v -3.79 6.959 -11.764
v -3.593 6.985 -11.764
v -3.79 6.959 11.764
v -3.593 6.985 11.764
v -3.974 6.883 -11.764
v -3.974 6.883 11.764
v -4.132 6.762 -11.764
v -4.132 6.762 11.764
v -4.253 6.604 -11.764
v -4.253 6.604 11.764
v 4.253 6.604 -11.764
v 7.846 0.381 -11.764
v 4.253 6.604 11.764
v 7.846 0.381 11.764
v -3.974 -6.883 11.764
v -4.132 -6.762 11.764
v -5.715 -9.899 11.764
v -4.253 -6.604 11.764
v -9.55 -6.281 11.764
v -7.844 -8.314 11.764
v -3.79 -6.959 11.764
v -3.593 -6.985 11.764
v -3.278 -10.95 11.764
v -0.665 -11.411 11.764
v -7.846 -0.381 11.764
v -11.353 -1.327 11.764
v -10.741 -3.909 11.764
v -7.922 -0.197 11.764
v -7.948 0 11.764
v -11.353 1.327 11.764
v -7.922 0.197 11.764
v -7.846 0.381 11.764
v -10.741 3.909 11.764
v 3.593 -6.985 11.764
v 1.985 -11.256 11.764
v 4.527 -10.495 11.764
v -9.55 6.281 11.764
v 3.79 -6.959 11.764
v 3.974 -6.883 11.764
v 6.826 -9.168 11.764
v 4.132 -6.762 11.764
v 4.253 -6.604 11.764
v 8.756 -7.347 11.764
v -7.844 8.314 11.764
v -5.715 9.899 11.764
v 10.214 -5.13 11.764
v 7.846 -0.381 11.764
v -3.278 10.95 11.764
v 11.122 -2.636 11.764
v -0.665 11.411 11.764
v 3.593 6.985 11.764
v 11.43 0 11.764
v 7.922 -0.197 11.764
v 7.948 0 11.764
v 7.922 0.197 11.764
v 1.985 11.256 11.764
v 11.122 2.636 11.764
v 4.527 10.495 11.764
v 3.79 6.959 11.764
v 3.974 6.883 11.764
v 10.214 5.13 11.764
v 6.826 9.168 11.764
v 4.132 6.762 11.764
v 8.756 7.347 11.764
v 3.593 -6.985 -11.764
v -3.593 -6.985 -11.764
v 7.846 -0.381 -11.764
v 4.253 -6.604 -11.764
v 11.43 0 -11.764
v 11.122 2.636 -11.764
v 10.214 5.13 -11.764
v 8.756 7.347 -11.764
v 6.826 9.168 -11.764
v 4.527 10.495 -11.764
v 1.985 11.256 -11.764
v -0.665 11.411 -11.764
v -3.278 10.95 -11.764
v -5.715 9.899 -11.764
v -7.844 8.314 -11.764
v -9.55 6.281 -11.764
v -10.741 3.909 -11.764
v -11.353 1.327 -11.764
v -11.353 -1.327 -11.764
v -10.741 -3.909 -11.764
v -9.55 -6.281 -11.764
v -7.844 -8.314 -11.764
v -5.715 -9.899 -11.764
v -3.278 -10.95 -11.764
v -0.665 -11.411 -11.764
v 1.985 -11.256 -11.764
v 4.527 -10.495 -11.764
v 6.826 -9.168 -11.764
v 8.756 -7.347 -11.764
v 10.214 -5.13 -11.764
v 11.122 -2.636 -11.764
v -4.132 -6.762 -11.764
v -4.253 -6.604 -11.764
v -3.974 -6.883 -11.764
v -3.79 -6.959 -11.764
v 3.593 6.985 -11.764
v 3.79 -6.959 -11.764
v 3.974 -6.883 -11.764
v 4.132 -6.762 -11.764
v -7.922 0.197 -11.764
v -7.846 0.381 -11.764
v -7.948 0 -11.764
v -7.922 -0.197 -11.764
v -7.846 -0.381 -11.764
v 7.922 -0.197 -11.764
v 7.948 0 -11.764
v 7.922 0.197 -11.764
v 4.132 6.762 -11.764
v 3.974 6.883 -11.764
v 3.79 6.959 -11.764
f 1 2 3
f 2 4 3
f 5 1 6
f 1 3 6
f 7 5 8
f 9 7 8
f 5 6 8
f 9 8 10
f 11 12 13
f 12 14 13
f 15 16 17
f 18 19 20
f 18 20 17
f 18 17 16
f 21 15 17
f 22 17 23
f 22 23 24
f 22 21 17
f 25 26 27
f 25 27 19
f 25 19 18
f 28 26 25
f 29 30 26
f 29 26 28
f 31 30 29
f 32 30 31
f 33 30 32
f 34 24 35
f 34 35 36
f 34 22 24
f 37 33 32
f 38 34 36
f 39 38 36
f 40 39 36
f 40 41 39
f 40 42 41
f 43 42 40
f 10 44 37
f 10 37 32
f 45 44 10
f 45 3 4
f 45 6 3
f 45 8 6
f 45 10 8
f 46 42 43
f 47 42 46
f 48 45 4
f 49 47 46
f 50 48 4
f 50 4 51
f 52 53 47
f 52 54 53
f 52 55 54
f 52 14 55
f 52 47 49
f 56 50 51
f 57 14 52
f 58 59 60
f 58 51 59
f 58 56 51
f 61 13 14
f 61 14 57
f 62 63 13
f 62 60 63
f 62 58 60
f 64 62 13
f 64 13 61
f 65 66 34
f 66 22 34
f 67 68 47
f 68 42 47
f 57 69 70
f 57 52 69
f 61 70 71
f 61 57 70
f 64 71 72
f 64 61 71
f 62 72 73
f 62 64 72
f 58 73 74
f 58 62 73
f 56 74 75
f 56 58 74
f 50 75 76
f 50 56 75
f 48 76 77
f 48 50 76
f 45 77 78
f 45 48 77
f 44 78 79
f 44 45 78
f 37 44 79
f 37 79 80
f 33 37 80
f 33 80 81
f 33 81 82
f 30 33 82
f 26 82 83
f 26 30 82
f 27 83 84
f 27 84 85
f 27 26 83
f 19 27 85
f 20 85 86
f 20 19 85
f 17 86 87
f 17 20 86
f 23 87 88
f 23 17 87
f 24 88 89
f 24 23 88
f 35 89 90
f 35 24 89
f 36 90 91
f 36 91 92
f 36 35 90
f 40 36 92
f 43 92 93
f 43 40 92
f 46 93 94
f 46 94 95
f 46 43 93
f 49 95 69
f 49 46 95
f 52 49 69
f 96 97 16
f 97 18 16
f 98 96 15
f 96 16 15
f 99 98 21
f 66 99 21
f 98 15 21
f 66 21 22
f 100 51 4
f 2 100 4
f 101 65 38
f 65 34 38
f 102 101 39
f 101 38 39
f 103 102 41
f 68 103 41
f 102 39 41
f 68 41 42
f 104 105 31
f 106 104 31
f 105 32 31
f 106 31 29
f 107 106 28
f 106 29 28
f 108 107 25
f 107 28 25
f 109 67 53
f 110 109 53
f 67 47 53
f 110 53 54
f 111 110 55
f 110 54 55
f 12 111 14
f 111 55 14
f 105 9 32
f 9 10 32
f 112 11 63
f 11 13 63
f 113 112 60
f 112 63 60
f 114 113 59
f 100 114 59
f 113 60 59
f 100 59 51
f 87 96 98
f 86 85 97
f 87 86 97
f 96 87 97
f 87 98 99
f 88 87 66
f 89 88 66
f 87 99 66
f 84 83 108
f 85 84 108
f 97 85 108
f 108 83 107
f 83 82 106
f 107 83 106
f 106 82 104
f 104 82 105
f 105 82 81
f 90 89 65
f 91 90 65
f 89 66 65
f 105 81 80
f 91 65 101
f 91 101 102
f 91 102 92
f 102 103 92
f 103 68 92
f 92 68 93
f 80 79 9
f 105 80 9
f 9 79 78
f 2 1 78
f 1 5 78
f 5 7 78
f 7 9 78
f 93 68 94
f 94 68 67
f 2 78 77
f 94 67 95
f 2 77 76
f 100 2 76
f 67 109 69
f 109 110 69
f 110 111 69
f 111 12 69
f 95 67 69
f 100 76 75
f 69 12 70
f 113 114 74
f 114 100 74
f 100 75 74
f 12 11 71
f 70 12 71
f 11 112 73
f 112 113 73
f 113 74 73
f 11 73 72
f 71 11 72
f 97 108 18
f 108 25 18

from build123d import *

# Parameters (mm, degrees)
CROQUIS1_R              = 11.43
SALIENTE_EXTRUIR1_DEPTH = 11.764075024


with BuildPart() as part:
    # Croquis1 → Saliente-Extruir1 (new body, symmetric)
    with BuildSketch(Plane.XY):
        Circle(CROQUIS1_R)
        with BuildLine():
            Line((3.592850725, 6.985), (-3.592850725, 6.985))
            ThreePointArc((-3.592850725, 6.985), (-3.973850725, 6.882911358), (-4.252762083, 6.604))
            Line((-4.252762083, 6.604), (-7.845612808, 0.381))
            ThreePointArc((-7.845612808, 0.381), (-7.94770145, 0), (-7.845612808, -0.381))
            Line((-7.845612808, -0.381), (-4.252762083, -6.604))
            ThreePointArc((-4.252762083, -6.604), (-3.973850725, -6.882911358), (-3.592850725, -6.985))
            Line((-3.592850725, -6.985), (3.592850725, -6.985))
            ThreePointArc((3.592850725, -6.985), (3.973850725, -6.882911358), (4.252762083, -6.604))
            Line((4.252762083, -6.604), (7.845612808, -0.381))
            ThreePointArc((7.845612808, -0.381), (7.94770145, 0), (7.845612808, 0.381))
            Line((7.845612808, 0.381), (4.252762083, 6.604))
            ThreePointArc((4.252762083, 6.604), (3.973850725, 6.882911358), (3.592850725, 6.985))
        make_face(mode=Mode.SUBTRACT)
    extrude(amount=SALIENTE_EXTRUIR1_DEPTH, both=True)


solid = part.part
